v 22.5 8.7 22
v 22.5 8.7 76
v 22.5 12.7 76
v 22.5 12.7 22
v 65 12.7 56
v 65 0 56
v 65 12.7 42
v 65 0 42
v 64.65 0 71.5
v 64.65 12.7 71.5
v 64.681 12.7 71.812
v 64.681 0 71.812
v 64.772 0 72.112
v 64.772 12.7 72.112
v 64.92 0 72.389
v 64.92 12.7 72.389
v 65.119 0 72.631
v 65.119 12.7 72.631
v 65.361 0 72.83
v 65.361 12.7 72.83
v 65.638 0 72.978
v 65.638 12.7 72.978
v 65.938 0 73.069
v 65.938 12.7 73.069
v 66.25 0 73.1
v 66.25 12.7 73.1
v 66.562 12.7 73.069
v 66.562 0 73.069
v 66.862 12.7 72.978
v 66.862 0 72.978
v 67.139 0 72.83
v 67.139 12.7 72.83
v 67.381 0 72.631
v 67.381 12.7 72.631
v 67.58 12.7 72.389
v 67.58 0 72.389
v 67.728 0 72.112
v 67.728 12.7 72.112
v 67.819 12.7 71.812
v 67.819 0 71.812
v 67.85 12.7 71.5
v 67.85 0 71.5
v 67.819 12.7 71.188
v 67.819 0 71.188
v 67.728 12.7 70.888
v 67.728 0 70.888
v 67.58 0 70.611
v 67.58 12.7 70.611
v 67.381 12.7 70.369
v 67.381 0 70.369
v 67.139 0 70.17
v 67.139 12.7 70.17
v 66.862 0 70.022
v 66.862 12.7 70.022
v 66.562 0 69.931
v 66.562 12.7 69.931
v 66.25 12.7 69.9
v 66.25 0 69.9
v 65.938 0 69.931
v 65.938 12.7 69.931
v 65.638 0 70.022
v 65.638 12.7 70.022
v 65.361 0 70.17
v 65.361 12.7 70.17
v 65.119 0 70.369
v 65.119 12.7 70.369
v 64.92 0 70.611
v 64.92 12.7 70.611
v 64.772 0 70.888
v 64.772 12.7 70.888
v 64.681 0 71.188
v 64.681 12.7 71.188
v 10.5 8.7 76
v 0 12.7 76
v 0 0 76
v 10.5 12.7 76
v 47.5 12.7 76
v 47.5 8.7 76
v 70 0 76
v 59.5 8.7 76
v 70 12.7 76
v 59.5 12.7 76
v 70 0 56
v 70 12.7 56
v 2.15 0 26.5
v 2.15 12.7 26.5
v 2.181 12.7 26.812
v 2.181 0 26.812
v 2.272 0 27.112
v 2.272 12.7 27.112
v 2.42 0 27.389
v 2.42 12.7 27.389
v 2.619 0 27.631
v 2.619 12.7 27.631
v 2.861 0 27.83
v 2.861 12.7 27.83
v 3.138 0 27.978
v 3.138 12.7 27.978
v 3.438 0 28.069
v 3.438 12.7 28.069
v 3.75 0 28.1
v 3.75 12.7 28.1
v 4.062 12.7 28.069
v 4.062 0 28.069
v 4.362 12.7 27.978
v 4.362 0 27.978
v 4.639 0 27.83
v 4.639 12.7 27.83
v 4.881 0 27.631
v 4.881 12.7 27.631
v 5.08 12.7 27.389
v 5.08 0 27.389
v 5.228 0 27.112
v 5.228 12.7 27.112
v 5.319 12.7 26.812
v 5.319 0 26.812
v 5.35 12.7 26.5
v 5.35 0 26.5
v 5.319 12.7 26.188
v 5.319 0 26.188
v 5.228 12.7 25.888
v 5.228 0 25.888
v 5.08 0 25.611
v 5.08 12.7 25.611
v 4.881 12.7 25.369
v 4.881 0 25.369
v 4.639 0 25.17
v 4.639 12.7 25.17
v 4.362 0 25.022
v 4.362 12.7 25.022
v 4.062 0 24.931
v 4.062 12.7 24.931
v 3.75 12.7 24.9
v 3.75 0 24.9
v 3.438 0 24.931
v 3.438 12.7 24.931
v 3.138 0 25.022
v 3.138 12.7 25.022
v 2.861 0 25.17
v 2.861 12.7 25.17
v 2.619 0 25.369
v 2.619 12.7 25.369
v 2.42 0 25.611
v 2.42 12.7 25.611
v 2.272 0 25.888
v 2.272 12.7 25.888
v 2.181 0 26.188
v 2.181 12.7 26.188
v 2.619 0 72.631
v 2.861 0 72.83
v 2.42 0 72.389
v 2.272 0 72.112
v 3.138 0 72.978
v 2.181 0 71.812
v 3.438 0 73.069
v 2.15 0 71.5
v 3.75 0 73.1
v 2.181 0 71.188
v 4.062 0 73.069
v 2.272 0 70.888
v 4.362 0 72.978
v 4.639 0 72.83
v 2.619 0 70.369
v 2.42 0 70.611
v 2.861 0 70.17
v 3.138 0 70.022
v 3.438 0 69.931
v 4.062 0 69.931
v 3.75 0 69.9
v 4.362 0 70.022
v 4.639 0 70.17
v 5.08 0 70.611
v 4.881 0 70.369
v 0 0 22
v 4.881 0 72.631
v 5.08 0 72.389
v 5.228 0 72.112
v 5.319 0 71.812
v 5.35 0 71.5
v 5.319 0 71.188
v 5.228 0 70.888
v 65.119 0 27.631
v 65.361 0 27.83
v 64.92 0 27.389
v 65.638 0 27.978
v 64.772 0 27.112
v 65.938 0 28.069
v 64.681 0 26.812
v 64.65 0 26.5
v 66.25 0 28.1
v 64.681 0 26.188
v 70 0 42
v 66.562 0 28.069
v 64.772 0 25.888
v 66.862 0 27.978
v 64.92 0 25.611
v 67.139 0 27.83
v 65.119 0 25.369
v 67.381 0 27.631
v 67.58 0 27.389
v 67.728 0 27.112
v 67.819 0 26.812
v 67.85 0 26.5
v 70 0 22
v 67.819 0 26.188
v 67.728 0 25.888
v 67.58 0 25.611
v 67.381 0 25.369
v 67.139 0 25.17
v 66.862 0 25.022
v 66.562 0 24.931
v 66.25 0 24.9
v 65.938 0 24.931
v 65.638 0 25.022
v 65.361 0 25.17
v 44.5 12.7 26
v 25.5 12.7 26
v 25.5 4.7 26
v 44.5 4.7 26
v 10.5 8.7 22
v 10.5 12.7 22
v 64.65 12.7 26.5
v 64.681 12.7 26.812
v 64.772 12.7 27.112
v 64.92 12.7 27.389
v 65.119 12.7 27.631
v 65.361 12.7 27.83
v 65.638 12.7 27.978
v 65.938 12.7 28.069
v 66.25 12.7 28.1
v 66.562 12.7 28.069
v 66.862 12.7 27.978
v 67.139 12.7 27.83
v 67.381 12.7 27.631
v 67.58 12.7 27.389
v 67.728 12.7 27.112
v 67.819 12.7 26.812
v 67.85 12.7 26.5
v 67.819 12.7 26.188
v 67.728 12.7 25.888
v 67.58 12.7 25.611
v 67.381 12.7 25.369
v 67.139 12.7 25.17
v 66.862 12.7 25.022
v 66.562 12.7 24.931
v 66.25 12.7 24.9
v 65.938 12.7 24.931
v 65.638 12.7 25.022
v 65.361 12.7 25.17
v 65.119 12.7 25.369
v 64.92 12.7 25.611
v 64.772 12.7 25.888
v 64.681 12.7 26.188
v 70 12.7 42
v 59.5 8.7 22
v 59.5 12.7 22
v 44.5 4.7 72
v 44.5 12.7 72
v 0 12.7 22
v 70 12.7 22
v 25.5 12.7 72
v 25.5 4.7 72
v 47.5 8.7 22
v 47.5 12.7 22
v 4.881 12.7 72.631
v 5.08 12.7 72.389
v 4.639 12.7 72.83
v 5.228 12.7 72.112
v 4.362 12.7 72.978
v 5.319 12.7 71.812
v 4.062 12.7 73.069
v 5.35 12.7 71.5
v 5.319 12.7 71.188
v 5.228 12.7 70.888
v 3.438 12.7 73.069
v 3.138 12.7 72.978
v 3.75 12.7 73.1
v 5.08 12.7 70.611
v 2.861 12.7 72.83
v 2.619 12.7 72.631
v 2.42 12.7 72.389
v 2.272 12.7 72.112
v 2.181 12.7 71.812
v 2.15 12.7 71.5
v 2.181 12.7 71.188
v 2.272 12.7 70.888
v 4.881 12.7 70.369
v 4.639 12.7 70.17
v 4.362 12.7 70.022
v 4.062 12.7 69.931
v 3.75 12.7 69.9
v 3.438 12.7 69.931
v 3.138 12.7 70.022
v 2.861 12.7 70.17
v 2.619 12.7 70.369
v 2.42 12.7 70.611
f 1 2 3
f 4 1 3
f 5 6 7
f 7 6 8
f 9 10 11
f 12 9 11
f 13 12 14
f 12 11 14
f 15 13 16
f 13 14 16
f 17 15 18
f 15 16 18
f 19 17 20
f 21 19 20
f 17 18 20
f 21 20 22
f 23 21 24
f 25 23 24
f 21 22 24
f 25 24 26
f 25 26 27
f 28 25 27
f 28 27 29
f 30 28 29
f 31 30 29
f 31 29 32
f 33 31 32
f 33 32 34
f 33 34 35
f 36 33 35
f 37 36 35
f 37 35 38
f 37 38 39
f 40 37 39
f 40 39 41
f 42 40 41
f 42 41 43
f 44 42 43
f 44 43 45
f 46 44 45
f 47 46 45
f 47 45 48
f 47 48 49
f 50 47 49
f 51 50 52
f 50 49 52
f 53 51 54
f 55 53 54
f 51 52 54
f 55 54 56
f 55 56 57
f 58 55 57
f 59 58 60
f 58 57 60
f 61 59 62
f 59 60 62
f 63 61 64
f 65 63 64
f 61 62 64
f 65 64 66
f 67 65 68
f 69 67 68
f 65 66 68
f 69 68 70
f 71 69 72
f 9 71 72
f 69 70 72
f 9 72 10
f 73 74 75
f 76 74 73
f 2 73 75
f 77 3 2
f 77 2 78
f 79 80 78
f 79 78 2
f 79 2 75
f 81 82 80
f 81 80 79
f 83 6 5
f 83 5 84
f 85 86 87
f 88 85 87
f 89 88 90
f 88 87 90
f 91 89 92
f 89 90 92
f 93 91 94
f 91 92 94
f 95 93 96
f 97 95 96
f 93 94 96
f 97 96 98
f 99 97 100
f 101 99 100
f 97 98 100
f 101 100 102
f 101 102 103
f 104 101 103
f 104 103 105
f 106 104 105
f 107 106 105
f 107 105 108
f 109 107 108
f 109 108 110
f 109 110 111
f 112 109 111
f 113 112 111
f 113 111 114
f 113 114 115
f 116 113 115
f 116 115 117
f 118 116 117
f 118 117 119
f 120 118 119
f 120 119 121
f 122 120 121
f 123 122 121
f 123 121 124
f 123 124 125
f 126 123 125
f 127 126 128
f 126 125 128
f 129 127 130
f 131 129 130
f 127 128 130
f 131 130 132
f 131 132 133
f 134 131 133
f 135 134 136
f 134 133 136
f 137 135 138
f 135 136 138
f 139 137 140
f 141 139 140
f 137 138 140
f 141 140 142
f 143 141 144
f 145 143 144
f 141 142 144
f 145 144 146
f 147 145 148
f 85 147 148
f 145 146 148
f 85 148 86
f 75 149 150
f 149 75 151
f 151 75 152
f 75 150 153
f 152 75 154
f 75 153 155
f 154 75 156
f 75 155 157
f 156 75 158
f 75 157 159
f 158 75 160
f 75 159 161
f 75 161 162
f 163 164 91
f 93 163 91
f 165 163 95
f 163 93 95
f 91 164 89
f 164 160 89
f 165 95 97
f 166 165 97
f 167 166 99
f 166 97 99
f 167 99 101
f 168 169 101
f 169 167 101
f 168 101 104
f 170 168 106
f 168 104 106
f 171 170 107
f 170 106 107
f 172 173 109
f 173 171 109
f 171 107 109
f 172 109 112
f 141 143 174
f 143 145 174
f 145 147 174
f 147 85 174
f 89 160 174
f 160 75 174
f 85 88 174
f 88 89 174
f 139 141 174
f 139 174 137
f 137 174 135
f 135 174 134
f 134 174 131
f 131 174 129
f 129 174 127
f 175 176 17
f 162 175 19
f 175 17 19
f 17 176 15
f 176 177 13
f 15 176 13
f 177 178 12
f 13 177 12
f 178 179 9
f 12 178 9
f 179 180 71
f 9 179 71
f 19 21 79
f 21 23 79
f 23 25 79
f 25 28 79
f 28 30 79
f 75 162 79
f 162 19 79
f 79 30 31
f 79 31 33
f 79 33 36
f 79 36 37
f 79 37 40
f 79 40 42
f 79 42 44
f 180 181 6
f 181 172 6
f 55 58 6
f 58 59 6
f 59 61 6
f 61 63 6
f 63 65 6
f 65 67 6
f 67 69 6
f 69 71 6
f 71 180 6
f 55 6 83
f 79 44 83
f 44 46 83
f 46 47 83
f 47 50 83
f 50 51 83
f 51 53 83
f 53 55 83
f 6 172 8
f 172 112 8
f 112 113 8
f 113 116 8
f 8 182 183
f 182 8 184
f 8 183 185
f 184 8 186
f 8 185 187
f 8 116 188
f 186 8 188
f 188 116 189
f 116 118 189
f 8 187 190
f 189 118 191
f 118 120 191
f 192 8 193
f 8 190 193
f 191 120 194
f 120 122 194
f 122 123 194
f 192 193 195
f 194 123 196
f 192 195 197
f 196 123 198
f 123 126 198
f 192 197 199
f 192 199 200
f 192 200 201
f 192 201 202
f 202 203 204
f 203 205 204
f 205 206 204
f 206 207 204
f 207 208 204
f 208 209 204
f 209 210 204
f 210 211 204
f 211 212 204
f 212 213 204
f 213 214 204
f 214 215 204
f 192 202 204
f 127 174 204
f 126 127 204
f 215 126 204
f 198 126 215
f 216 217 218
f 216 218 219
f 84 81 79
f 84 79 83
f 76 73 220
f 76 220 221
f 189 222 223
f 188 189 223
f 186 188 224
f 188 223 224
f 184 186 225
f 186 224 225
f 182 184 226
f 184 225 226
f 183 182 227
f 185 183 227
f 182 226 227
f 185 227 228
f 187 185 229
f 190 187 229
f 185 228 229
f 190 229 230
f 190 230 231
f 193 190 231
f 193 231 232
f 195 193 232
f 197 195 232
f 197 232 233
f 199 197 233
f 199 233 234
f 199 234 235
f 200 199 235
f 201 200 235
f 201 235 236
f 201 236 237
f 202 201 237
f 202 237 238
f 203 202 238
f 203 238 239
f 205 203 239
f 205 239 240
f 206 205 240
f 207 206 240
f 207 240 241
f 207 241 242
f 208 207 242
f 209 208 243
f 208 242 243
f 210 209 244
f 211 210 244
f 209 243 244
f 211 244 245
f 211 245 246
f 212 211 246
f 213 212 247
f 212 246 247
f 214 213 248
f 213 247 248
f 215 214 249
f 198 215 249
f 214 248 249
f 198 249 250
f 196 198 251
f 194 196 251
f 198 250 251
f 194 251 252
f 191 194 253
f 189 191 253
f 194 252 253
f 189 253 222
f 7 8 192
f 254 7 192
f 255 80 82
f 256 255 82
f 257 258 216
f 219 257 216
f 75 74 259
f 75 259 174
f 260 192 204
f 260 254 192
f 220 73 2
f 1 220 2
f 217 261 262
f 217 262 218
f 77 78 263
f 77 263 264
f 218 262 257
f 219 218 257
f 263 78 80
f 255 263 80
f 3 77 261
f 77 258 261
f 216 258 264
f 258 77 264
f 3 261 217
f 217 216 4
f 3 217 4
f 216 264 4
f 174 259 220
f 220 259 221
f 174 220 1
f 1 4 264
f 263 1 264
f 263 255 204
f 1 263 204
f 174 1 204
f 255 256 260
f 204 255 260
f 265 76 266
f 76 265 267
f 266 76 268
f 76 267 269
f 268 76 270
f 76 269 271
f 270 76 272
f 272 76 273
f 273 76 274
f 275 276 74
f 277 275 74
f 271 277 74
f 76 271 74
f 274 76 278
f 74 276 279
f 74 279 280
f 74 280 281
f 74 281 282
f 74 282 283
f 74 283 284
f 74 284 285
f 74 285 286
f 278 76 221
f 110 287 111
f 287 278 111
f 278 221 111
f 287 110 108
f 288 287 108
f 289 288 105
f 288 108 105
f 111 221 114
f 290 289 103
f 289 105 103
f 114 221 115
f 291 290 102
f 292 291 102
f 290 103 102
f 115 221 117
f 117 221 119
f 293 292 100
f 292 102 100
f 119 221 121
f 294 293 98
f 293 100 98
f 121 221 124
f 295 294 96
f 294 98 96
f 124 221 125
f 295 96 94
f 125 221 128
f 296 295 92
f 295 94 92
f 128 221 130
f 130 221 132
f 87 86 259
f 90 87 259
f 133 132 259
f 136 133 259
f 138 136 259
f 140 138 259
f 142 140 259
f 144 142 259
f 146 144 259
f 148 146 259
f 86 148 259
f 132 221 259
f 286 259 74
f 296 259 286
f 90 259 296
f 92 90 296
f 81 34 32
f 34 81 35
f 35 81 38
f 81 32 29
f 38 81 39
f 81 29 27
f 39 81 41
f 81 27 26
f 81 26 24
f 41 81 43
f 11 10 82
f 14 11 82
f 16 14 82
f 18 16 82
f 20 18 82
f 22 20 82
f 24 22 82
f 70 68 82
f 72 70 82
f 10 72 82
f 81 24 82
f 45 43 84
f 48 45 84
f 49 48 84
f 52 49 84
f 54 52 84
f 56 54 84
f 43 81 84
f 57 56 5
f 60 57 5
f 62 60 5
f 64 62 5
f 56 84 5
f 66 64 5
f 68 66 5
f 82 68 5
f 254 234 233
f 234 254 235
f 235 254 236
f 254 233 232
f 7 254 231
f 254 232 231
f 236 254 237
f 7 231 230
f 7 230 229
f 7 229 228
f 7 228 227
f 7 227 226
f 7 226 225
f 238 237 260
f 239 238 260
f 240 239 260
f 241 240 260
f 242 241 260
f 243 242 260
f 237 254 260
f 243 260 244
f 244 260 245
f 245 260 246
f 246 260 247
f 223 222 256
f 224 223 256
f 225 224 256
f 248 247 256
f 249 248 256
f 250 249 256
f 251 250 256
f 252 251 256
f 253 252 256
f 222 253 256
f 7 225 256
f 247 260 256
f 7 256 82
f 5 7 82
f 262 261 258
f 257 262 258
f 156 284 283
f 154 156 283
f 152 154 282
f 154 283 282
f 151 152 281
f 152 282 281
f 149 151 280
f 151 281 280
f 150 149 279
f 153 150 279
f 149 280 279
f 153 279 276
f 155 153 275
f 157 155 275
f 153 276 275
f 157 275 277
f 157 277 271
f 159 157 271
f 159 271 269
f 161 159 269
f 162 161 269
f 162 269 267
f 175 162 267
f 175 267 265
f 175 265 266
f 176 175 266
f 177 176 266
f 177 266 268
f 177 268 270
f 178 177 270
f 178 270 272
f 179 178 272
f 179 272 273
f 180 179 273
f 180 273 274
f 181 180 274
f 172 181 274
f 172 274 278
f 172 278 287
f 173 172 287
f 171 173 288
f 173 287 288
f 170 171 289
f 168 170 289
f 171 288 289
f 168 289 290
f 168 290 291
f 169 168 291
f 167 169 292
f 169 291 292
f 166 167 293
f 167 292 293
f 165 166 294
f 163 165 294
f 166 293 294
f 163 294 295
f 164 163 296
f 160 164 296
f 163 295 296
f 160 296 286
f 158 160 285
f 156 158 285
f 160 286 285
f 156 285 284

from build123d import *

# Parameters (mm, degrees)
RESSALTO_EXTRUS_O1_DEPTH    = 98
ESBO_O4_W                   = 33
ESBO_O4_H                   = 22
CORTE_EXTRUS_O3_DEPTH       = 25
ESBO_O10_W                  = 12
ESBO_O10_H                  = 4
CORTE_EXTRUS_O8_DEPTH       = 122.545423608
ESBO_O11_R                  = 1.6
CORTE_EXTRUS_O9_DEPTH       = 20
ESBO_O15_W                  = 4
ESBO_O15_H                  = 22
CORTE_EXTRUS_O11_DEPTH      = 137.386546257
CORTE_EXTRUS_O12_DEPTH      = 10
CORTE_EXTRUS_O12_DEPTH_BACK = 41
ESBO_O16_W                  = 5
ESBO_O16_H                  = 14
ESBO_O17_W                  = 11.435879356
ESBO_O17_H                  = 99.573316557
CORTE_EXTRUS_O13_DEPTH      = 20
ESBO_O18_W                  = 19
ESBO_O18_H                  = 46
CORTE_EXTRUS_O14_DEPTH      = 8


with BuildPart() as part:
    # Esboço1 → Ressalto-extrusão1 (new body)
    with BuildSketch(Plane.XY):
        Polygon((0, 0), (94, 0), (75.862520314, 12.7), (0, 12.7), align=None)
    extrude(amount=RESSALTO_EXTRUS_O1_DEPTH)

    # Esboço4 → Corte-extrusão3 (cut)
    with BuildSketch(Plane(origin=(0, 12.7, 0), x_dir=(1, 0, 0), z_dir=(0, 1, 0))):
        with Locations((16.5, -87)):
            Rectangle(ESBO_O4_W, ESBO_O4_H)
        with Locations((16.5, -11)):
            Rectangle(ESBO_O4_W, ESBO_O4_H)
        with Locations((53.5, -87)):
            Rectangle(ESBO_O4_W, ESBO_O4_H)
        with Locations((53.5, -11)):
            Rectangle(ESBO_O4_W, ESBO_O4_H)
    extrude(amount=-CORTE_EXTRUS_O3_DEPTH, mode=Mode.SUBTRACT)

    # Esboço10 → Corte-extrusão8 (cut, through all)
    with BuildSketch(Plane.XY.offset(76)):
        with Locations((16.5, 10.7)):
            Rectangle(ESBO_O10_W, ESBO_O10_H)
        with Locations((53.5, 10.7)):
            Rectangle(ESBO_O10_W, ESBO_O10_H)
    extrude(amount=-CORTE_EXTRUS_O8_DEPTH, mode=Mode.SUBTRACT)

    # Esboço11 → Corte-extrusão9 (cut)
    with BuildSketch(Plane(origin=(0, 12.7, 0), x_dir=(1, 0, 0), z_dir=(0, 1, 0))):
        with Locations((3.75, -71.5)):
            Circle(ESBO_O11_R)
        with Locations((3.75, -26.5)):
            Circle(ESBO_O11_R)
        with Locations((66.25, -26.5)):
            Circle(ESBO_O11_R)
        with Locations((66.25, -71.5)):
            Circle(ESBO_O11_R)
    extrude(amount=-CORTE_EXTRUS_O9_DEPTH, mode=Mode.SUBTRACT)

    # Esboço15 → Corte-extrusão11 (cut, through all)
    with BuildSketch(Plane(origin=(0, 12.7, 0), x_dir=(1, 0, 0), z_dir=(0, 1, 0))):
        with Locations((35, -11)):
            Rectangle(ESBO_O15_W, ESBO_O15_H)
        with Locations((35, -87)):
            Rectangle(ESBO_O15_W, ESBO_O15_H)
    extrude(amount=-CORTE_EXTRUS_O11_DEPTH, mode=Mode.SUBTRACT)

    # Esboço16 → Corte-extrusão12 (cut, two sides: drawn at the far end of the back side and taken through both)
    with BuildSketch(Plane(origin=(0, 12.7, 0), x_dir=(1, 0, 0), z_dir=(0, 1, 0)).offset(-CORTE_EXTRUS_O12_DEPTH_BACK)):
        Polygon((95.832875802, -109.85505817), (95.832875802, 2.472968948), (70, 2.472968948), (70, 0), (75.862520314, 0), (75.862520314, -98), (70, -98), (70, -109.85505817), align=None)
        with Locations((67.5, -49)):
            Rectangle(ESBO_O16_W, ESBO_O16_H)
    extrude(amount=CORTE_EXTRUS_O12_DEPTH + CORTE_EXTRUS_O12_DEPTH_BACK, mode=Mode.SUBTRACT)

    # Esboço17 → Corte-extrusão13 (cut)
    with BuildSketch(Plane(origin=(0, 12.7, 0), x_dir=(1, 0, 0), z_dir=(0, 1, 0))):
        with Locations((75.717939678, -49.786658279)):
            Rectangle(ESBO_O17_W, ESBO_O17_H)
    extrude(amount=-CORTE_EXTRUS_O13_DEPTH, mode=Mode.SUBTRACT)

    # Esboço18 → Corte-extrusão14 (cut)
    with BuildSketch(Plane(origin=(0, 12.7, 0), x_dir=(1, 0, 0), z_dir=(0, 1, 0))):
        with Locations((35, -49)):
            Rectangle(ESBO_O18_W, ESBO_O18_H)
    extrude(amount=-CORTE_EXTRUS_O14_DEPTH, mode=Mode.SUBTRACT)


solid = part.part
